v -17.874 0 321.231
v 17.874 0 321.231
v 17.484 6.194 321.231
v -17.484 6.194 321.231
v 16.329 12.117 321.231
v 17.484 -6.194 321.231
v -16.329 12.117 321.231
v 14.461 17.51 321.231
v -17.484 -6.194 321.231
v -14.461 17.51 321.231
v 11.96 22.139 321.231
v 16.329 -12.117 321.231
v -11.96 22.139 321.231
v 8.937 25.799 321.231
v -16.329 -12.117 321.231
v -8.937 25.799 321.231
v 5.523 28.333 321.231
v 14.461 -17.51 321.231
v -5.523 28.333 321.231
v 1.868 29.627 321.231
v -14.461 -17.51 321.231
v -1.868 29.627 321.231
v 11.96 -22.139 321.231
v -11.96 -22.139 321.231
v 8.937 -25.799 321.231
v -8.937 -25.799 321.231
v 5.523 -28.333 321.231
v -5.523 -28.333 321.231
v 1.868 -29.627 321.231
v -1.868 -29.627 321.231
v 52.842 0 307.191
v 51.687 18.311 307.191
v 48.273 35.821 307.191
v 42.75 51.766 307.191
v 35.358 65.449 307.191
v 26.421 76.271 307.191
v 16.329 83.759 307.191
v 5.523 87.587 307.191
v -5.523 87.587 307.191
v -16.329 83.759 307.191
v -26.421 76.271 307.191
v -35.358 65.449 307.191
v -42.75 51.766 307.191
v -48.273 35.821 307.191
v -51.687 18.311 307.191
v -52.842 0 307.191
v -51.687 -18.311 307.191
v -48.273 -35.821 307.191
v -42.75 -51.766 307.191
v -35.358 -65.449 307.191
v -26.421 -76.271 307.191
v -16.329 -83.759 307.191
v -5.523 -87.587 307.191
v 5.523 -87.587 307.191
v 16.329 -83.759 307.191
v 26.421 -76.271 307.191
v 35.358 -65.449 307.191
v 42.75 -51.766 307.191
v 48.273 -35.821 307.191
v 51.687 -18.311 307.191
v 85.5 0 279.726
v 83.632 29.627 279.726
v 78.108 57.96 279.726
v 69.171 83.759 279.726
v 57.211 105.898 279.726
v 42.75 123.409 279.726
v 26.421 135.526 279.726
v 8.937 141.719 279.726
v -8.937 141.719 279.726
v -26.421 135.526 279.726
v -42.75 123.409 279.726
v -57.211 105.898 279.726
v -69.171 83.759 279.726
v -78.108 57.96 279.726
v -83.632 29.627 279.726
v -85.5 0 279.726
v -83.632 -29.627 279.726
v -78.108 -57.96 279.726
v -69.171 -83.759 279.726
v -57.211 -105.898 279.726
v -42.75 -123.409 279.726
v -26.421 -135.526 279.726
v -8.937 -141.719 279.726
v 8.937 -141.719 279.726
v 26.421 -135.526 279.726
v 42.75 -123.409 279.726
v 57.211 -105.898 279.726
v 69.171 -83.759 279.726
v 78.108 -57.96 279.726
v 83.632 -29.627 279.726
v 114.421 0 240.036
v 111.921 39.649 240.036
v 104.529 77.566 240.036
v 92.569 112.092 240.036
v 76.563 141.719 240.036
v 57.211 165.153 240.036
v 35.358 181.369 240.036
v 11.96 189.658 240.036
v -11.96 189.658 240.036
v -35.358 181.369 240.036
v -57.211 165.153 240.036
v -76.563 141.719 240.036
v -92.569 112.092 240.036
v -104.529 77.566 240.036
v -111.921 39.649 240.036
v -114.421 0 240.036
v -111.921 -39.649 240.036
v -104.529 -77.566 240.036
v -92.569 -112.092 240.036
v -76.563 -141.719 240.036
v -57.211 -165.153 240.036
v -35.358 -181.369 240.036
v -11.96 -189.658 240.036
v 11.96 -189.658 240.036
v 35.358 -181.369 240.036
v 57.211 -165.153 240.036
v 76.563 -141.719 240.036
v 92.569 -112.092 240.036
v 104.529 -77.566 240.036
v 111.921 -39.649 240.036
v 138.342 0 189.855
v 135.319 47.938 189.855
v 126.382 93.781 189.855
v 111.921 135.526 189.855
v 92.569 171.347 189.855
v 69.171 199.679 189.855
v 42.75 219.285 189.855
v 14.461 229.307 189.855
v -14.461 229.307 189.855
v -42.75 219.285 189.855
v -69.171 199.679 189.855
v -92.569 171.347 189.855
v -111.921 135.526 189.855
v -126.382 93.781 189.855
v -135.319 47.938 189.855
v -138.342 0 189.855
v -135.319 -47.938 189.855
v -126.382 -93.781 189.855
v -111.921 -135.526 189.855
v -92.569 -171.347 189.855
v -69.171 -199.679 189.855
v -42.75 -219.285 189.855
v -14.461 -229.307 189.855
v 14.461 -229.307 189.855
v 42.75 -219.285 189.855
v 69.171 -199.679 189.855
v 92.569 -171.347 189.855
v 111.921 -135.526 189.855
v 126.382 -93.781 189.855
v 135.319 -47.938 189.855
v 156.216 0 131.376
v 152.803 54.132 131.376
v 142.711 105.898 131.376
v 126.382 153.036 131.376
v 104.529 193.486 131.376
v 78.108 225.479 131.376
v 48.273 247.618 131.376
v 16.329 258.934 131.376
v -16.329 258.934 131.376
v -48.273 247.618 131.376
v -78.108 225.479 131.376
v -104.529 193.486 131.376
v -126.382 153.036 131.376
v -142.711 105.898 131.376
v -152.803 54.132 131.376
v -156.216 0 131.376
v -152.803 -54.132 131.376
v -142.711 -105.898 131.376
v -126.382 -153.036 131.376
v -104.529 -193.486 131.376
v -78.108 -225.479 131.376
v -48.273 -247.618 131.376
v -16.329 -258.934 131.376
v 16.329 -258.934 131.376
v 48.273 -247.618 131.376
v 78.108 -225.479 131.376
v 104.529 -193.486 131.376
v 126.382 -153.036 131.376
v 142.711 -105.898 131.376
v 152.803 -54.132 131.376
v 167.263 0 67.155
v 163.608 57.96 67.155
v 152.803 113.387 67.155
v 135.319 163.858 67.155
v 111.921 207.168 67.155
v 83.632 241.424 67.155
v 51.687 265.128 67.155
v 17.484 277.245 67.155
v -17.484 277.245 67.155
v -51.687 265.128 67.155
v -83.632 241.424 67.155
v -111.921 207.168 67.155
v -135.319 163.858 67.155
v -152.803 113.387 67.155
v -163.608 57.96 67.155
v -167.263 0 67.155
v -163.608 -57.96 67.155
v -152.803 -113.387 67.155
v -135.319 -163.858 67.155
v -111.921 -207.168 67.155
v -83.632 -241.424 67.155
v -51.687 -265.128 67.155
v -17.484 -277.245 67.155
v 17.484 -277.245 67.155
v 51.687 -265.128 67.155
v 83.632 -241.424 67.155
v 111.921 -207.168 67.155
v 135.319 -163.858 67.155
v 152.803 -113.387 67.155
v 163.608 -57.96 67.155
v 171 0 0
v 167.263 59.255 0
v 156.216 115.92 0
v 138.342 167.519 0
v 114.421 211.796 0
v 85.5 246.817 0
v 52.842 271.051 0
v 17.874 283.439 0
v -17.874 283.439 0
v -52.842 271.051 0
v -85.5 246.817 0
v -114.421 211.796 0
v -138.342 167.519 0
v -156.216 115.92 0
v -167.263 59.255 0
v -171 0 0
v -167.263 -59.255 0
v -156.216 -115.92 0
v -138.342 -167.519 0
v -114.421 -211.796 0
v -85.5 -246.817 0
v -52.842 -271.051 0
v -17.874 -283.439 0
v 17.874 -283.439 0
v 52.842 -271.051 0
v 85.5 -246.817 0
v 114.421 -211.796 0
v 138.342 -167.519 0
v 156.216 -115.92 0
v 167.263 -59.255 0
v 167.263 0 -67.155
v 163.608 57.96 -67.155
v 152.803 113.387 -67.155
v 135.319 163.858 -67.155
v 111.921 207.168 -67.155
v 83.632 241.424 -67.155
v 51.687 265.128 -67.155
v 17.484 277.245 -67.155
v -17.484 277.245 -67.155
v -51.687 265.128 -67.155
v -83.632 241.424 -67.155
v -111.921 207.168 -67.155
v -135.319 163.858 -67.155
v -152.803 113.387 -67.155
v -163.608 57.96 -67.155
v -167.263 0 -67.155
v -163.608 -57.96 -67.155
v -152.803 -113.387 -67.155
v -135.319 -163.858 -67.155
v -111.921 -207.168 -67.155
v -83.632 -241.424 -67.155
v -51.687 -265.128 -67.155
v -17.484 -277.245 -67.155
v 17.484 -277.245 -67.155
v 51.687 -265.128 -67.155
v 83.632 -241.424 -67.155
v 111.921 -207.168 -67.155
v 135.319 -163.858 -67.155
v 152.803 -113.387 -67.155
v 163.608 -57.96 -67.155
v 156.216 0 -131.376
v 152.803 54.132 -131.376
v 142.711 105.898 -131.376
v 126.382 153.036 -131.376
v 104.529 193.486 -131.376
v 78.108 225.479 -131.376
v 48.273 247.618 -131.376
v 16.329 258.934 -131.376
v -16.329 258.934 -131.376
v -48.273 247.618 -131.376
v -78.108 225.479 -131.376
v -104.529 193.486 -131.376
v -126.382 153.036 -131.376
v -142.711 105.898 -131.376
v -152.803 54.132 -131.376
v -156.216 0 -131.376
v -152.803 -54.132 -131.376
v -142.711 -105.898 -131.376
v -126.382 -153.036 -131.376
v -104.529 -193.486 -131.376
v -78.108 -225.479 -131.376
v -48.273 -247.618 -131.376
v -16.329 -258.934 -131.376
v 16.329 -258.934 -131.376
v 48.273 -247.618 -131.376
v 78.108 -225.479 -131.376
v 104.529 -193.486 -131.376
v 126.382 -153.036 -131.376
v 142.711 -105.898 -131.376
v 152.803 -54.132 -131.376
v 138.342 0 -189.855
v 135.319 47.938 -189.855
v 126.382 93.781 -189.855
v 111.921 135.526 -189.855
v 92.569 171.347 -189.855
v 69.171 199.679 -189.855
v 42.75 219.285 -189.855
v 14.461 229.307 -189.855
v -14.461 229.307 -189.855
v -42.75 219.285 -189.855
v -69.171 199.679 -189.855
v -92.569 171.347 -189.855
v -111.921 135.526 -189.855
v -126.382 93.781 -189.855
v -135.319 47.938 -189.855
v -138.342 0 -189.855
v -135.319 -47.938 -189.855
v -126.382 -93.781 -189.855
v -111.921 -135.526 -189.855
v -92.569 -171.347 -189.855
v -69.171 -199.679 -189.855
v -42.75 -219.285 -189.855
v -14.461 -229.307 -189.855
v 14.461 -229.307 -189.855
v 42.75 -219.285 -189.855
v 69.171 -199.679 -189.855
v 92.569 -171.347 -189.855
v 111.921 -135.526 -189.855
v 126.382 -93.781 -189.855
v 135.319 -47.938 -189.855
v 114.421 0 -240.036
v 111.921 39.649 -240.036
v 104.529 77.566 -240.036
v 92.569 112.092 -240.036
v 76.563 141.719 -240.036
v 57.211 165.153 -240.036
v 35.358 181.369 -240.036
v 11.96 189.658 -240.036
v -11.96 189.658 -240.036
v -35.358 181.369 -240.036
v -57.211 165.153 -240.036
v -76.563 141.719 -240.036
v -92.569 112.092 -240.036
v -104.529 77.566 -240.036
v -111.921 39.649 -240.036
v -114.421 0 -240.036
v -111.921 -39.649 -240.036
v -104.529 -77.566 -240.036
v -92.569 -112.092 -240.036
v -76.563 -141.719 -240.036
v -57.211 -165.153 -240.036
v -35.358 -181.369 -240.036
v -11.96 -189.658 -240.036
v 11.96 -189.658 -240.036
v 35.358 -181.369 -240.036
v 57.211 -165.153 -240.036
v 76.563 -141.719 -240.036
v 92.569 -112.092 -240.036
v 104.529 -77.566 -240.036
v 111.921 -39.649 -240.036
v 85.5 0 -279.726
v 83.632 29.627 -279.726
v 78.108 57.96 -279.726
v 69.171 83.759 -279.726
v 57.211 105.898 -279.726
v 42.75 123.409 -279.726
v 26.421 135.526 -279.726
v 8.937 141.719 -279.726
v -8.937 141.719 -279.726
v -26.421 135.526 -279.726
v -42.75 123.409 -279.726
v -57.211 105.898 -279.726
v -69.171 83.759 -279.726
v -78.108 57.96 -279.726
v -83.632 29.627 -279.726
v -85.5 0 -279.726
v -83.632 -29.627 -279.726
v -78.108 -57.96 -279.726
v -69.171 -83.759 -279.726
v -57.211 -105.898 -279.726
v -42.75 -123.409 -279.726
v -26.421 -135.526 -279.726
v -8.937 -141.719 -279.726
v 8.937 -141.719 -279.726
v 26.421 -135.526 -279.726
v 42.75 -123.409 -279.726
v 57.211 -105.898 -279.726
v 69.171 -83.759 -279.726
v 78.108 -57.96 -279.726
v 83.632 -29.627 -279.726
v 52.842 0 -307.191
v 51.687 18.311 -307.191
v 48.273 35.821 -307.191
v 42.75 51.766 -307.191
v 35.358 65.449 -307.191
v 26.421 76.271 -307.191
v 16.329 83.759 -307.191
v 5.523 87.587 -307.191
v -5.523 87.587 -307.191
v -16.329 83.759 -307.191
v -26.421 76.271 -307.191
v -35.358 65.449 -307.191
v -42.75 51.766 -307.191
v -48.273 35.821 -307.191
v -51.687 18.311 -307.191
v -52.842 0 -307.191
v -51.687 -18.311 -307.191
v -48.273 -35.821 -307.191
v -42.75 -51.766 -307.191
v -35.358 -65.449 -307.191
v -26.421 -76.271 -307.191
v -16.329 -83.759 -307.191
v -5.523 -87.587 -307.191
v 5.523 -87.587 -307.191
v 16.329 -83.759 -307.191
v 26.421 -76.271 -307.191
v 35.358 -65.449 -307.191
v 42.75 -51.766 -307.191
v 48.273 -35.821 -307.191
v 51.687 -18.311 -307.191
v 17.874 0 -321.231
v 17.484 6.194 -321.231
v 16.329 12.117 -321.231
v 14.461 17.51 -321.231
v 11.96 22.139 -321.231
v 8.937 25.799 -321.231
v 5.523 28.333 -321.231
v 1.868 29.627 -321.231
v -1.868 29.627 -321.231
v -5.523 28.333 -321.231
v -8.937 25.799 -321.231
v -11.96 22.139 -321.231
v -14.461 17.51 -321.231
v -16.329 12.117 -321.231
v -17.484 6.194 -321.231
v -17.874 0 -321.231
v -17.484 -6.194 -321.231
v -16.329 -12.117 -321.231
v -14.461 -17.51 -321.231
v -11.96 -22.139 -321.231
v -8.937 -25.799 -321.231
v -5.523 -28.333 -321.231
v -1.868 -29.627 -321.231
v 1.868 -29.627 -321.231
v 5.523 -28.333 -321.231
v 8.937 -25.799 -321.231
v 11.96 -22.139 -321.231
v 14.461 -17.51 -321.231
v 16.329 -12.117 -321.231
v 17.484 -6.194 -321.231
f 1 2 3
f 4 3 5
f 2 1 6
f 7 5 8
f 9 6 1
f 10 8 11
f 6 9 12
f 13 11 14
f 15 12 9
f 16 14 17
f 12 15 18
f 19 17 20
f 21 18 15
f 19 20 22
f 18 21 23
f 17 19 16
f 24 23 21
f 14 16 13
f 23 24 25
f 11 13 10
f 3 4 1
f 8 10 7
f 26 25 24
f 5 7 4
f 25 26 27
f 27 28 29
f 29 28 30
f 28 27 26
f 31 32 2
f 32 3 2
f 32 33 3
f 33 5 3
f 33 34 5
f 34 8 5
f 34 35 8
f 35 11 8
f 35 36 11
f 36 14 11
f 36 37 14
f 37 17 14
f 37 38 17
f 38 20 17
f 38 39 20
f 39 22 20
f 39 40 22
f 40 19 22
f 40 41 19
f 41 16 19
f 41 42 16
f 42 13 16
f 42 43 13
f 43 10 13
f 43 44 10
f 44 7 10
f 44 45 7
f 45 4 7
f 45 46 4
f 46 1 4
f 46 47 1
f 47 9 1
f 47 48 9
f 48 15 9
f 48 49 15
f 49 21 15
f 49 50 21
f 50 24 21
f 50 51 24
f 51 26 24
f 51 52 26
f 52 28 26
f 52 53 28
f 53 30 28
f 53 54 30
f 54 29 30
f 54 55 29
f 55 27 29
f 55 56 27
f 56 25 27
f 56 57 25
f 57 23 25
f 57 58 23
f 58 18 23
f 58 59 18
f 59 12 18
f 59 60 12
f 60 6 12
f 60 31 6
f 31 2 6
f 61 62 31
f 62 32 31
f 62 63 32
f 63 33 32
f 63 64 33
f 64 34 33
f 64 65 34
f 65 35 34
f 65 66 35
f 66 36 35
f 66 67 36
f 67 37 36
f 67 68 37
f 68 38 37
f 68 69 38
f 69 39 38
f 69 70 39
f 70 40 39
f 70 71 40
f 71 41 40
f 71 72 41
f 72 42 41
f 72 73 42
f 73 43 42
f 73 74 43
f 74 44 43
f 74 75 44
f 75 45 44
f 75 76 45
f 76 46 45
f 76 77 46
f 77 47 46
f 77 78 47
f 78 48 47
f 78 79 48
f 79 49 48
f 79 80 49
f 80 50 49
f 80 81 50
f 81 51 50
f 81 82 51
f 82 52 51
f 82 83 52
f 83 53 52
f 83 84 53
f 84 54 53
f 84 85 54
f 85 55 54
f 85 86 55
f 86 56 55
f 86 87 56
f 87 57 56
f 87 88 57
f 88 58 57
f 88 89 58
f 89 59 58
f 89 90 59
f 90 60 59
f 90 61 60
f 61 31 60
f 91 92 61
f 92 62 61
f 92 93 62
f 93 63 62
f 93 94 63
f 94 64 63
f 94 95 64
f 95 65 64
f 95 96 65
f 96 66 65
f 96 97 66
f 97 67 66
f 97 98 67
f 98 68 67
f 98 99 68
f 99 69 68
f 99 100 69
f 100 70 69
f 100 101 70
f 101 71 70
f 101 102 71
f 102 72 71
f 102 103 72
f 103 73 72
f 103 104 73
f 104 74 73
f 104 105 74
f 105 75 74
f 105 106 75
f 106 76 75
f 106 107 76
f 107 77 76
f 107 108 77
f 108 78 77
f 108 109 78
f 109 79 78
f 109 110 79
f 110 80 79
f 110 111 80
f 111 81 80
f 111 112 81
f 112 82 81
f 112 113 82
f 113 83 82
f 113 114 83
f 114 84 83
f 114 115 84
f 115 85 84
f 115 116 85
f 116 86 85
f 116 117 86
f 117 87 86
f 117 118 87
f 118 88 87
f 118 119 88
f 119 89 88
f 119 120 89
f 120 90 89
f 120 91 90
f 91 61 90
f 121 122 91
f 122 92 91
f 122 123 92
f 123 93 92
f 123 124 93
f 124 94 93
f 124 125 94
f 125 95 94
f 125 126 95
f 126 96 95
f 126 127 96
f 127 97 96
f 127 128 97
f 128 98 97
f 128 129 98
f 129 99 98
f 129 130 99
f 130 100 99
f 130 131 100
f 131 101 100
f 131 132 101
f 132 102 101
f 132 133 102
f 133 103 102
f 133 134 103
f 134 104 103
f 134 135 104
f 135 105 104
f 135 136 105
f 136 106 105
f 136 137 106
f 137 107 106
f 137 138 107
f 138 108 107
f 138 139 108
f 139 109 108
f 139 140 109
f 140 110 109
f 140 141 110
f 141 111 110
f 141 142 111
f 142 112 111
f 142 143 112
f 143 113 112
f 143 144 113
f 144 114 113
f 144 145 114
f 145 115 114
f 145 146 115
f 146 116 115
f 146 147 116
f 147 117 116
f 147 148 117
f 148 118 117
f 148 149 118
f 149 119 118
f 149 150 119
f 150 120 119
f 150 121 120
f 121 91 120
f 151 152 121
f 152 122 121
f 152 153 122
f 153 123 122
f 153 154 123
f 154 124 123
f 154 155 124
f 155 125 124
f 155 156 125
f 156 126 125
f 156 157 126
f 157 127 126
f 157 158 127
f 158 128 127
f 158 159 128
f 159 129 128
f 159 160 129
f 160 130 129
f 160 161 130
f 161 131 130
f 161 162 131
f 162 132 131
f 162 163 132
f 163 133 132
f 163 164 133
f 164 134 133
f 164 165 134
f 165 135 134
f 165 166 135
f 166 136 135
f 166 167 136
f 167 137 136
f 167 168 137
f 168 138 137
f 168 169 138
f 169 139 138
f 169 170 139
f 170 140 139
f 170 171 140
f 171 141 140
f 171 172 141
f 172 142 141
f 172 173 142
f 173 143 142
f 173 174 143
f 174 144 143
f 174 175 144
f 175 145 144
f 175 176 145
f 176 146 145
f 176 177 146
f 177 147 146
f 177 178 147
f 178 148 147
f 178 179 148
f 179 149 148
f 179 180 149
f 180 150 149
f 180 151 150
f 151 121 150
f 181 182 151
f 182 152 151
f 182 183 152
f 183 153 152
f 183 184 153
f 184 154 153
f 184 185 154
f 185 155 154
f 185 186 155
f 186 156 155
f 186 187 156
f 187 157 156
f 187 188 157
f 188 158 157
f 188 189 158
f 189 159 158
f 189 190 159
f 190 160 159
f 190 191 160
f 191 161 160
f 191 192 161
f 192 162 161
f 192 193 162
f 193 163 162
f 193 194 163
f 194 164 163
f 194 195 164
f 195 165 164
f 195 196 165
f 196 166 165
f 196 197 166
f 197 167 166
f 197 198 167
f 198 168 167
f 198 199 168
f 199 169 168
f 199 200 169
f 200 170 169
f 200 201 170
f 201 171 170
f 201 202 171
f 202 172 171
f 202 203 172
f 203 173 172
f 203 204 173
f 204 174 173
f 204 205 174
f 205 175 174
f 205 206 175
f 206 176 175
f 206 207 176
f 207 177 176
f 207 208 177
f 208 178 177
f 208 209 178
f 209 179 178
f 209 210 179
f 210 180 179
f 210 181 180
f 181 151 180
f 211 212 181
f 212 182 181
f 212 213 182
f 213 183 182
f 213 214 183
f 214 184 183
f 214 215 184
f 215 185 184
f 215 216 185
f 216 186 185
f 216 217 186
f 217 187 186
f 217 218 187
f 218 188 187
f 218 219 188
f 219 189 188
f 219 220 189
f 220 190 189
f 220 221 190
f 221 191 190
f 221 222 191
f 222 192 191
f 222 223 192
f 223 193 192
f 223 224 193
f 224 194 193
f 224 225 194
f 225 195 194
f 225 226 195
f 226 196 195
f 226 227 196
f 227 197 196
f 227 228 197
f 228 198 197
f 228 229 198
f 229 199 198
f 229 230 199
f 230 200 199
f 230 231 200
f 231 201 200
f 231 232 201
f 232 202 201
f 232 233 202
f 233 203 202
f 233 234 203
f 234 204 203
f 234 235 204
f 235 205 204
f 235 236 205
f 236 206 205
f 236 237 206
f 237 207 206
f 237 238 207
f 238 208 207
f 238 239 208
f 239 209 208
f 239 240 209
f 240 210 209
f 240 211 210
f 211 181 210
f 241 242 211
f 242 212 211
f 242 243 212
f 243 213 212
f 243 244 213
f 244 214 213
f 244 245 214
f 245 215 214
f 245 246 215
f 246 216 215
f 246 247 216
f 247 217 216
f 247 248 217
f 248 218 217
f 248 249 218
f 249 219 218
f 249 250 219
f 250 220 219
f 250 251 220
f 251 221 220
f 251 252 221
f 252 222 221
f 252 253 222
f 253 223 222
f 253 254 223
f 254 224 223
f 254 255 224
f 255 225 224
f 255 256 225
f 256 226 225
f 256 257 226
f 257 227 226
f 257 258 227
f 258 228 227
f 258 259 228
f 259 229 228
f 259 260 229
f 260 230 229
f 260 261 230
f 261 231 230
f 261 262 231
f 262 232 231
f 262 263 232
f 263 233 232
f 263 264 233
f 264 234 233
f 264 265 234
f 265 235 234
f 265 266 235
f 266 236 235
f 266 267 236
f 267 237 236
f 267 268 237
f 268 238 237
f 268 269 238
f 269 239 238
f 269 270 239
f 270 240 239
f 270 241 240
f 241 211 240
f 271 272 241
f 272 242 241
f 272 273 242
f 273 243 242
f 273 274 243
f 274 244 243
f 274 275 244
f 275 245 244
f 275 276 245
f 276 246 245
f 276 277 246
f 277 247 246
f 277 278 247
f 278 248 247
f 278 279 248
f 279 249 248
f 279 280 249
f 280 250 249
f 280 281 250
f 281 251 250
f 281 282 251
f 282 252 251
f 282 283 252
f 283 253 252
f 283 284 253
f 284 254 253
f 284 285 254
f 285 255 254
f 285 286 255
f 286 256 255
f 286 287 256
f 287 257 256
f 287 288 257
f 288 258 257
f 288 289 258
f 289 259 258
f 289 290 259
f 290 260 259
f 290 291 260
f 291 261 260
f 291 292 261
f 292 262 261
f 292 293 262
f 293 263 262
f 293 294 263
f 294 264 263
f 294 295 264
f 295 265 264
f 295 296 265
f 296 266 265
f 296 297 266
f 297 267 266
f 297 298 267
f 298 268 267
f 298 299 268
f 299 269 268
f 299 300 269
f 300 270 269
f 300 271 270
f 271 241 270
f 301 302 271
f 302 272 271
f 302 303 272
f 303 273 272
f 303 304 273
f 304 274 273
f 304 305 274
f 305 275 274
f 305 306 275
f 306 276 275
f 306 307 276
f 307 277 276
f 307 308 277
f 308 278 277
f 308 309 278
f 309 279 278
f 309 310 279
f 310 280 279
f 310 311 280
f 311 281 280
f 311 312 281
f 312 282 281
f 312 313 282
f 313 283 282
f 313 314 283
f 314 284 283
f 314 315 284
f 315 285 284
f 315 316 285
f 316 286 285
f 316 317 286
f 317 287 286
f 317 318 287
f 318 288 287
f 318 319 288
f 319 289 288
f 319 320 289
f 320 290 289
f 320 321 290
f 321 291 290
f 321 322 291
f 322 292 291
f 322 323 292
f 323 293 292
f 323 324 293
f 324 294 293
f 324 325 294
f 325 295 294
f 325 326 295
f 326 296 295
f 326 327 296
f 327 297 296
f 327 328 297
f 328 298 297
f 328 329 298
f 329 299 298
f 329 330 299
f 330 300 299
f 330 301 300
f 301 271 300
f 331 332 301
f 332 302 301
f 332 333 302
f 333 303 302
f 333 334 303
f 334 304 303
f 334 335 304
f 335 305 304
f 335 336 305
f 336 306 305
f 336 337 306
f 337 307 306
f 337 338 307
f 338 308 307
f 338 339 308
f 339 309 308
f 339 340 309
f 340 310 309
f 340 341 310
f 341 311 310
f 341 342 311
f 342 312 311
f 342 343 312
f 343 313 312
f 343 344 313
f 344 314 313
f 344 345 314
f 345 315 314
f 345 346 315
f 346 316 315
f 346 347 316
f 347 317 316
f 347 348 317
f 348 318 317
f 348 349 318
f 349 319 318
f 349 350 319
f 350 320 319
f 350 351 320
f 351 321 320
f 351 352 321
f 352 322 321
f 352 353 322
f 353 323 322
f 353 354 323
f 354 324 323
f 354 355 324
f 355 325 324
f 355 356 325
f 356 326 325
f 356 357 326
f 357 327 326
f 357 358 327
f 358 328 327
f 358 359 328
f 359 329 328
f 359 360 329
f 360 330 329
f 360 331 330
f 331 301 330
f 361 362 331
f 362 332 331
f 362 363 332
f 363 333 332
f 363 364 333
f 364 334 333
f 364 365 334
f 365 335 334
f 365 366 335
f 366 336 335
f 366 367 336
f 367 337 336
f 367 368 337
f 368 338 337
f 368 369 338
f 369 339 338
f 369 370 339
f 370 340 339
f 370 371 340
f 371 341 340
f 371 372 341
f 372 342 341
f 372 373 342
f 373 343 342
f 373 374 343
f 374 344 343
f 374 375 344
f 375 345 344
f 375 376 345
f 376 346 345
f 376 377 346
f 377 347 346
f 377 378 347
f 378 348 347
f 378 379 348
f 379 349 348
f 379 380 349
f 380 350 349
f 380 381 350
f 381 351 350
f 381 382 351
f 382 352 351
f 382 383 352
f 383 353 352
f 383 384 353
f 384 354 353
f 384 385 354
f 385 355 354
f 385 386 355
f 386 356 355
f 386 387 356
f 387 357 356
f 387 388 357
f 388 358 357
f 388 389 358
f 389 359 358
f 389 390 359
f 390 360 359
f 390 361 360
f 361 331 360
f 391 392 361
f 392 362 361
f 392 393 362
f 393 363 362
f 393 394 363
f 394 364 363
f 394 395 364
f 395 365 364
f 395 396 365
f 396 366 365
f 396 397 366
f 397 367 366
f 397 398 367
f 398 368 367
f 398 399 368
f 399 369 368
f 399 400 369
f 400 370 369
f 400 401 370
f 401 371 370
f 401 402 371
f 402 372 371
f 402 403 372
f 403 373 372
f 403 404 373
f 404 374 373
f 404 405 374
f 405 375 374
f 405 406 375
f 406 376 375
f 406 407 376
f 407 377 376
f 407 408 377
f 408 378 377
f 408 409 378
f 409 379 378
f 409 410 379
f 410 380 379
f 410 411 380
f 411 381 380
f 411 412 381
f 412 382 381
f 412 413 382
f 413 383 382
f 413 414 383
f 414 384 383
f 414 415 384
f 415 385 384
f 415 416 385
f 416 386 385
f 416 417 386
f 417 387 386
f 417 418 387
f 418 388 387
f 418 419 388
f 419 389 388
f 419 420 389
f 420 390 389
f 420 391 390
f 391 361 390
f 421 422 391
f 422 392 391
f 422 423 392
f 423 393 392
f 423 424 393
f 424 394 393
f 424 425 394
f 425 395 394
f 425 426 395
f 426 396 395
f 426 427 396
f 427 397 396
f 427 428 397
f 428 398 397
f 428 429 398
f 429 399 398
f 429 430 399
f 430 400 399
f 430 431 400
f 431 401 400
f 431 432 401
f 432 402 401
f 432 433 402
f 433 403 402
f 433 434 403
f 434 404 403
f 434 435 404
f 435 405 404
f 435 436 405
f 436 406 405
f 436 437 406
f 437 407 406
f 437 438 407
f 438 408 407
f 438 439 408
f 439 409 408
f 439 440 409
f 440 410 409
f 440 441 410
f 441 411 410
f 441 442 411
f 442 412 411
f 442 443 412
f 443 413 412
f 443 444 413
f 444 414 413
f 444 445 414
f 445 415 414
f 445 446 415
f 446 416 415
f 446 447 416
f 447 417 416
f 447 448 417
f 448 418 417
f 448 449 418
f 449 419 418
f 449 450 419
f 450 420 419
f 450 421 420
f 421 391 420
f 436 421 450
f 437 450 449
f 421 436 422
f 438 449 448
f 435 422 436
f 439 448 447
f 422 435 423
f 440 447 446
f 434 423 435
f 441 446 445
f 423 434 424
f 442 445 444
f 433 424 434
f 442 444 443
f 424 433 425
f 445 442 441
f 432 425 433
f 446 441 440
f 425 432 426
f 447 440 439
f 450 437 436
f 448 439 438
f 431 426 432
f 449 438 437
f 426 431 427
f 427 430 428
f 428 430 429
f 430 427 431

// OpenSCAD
// Generated by SolidPython 1.0.1 on 2020-07-29 00:39:26


scale(v = [9, 15, 17]) {
	sphere(r = 19);
}
/***********************************************
*********      SolidPython code:      **********
************************************************
 
# import packages: SolidPython
from solid import *
from solid.utils import *
from itertools import chain, combinations


class Resize:

    def __init__(self, scad_file):
        self.scad_file = scad_file
        #self.scad_file = import_scad(scad_file)
        # cone/cylinder param:
        self.r1 = 0
        self.r2 = 0
        self.h = 0
        # rectangular prism param:
        self.w = 0
        self.l = 0
        # ellipse param:
        self.r = 0

    # import OpenScad code (file name corresponds to shape)


    # classify shape + parameters
    def assign(self, param1, param2, param3):
        if self.scad_file == 'cone.scad':
            self.r1 = param1
            self.r2 = param2
            self.h = param3
        elif self.scad_file == 'cylinder.scad':
            self.r1 = param1
            self.r2 = param2
            self.h = param3
        elif self.scad_file == 'rectangularPrism.scad':
            self.h = param1
            self.l = param2
            self.w = param3
        else:
            self.r = param1
            self.h = param2

    # resize parameters
    def iterate(self):
        x = range(3, 20, 2)
        i = 1
        if self.scad_file == 'cone.scad':
            tempList = list(combinations(x, 2))
            for temp in tempList:
                param1 = temp[0]
                param2 = temp[1]
                filepath = 'produced_scad_files/' + 'cone' + str(param1) + '_' + str(param2) + '_' + '.scad'
                scad_render_to_file(cylinder(h=param1, r1=param2, r2=0), filepath)

        elif self.scad_file == 'cylinder.scad':
            tempList = list(combinations(x, 3))
            for temp in tempList:
                param1 = temp[0]
                param2 = temp[1]
                filepath = 'produced_scad_files/' + 'cylinder' + str(param1) + '_' + str(param2) + '_' + '.scad'
                scad_render_to_file(cylinder(h=param1, r1=param2, r2=param2), filepath)

        elif self.scad_file == 'rectangularPrism.scad':
            tempList = list(combinations(x, 3))
            for temp in tempList:
                param1 = temp[0]
                param2 = temp[1]
                param3 = temp[2]
                filepath = 'produced_scad_files/' + 'rectangularPrism' + str(param1) + '_' + str(param2) + '_' + str(
                    param3) + '.scad'
                scad_render_to_file(cube(size=(param1, param2, param3)), filepath)

        elif self.scad_file == 'ellipse.scad':
            tempList = list(combinations(x, 4))
            for temp in tempList:
                param1 = temp[0]
                param2 = temp[1]
                param3 = temp[2]
                param4 = temp[3]
                filepath = 'produced_scad_files/' + 'ellipse' + str(param1) + '_' + str(param2) + '_' + str(param3) + '_' + str(param4) + '.scad'
                scad_render_to_file(scale([param1, param2, param3])(sphere(r=param4)), filepath)

    def render_to_scadfile(self):
        scad_render_to_file(scad, 'example.scad') 
 
************************************************/
